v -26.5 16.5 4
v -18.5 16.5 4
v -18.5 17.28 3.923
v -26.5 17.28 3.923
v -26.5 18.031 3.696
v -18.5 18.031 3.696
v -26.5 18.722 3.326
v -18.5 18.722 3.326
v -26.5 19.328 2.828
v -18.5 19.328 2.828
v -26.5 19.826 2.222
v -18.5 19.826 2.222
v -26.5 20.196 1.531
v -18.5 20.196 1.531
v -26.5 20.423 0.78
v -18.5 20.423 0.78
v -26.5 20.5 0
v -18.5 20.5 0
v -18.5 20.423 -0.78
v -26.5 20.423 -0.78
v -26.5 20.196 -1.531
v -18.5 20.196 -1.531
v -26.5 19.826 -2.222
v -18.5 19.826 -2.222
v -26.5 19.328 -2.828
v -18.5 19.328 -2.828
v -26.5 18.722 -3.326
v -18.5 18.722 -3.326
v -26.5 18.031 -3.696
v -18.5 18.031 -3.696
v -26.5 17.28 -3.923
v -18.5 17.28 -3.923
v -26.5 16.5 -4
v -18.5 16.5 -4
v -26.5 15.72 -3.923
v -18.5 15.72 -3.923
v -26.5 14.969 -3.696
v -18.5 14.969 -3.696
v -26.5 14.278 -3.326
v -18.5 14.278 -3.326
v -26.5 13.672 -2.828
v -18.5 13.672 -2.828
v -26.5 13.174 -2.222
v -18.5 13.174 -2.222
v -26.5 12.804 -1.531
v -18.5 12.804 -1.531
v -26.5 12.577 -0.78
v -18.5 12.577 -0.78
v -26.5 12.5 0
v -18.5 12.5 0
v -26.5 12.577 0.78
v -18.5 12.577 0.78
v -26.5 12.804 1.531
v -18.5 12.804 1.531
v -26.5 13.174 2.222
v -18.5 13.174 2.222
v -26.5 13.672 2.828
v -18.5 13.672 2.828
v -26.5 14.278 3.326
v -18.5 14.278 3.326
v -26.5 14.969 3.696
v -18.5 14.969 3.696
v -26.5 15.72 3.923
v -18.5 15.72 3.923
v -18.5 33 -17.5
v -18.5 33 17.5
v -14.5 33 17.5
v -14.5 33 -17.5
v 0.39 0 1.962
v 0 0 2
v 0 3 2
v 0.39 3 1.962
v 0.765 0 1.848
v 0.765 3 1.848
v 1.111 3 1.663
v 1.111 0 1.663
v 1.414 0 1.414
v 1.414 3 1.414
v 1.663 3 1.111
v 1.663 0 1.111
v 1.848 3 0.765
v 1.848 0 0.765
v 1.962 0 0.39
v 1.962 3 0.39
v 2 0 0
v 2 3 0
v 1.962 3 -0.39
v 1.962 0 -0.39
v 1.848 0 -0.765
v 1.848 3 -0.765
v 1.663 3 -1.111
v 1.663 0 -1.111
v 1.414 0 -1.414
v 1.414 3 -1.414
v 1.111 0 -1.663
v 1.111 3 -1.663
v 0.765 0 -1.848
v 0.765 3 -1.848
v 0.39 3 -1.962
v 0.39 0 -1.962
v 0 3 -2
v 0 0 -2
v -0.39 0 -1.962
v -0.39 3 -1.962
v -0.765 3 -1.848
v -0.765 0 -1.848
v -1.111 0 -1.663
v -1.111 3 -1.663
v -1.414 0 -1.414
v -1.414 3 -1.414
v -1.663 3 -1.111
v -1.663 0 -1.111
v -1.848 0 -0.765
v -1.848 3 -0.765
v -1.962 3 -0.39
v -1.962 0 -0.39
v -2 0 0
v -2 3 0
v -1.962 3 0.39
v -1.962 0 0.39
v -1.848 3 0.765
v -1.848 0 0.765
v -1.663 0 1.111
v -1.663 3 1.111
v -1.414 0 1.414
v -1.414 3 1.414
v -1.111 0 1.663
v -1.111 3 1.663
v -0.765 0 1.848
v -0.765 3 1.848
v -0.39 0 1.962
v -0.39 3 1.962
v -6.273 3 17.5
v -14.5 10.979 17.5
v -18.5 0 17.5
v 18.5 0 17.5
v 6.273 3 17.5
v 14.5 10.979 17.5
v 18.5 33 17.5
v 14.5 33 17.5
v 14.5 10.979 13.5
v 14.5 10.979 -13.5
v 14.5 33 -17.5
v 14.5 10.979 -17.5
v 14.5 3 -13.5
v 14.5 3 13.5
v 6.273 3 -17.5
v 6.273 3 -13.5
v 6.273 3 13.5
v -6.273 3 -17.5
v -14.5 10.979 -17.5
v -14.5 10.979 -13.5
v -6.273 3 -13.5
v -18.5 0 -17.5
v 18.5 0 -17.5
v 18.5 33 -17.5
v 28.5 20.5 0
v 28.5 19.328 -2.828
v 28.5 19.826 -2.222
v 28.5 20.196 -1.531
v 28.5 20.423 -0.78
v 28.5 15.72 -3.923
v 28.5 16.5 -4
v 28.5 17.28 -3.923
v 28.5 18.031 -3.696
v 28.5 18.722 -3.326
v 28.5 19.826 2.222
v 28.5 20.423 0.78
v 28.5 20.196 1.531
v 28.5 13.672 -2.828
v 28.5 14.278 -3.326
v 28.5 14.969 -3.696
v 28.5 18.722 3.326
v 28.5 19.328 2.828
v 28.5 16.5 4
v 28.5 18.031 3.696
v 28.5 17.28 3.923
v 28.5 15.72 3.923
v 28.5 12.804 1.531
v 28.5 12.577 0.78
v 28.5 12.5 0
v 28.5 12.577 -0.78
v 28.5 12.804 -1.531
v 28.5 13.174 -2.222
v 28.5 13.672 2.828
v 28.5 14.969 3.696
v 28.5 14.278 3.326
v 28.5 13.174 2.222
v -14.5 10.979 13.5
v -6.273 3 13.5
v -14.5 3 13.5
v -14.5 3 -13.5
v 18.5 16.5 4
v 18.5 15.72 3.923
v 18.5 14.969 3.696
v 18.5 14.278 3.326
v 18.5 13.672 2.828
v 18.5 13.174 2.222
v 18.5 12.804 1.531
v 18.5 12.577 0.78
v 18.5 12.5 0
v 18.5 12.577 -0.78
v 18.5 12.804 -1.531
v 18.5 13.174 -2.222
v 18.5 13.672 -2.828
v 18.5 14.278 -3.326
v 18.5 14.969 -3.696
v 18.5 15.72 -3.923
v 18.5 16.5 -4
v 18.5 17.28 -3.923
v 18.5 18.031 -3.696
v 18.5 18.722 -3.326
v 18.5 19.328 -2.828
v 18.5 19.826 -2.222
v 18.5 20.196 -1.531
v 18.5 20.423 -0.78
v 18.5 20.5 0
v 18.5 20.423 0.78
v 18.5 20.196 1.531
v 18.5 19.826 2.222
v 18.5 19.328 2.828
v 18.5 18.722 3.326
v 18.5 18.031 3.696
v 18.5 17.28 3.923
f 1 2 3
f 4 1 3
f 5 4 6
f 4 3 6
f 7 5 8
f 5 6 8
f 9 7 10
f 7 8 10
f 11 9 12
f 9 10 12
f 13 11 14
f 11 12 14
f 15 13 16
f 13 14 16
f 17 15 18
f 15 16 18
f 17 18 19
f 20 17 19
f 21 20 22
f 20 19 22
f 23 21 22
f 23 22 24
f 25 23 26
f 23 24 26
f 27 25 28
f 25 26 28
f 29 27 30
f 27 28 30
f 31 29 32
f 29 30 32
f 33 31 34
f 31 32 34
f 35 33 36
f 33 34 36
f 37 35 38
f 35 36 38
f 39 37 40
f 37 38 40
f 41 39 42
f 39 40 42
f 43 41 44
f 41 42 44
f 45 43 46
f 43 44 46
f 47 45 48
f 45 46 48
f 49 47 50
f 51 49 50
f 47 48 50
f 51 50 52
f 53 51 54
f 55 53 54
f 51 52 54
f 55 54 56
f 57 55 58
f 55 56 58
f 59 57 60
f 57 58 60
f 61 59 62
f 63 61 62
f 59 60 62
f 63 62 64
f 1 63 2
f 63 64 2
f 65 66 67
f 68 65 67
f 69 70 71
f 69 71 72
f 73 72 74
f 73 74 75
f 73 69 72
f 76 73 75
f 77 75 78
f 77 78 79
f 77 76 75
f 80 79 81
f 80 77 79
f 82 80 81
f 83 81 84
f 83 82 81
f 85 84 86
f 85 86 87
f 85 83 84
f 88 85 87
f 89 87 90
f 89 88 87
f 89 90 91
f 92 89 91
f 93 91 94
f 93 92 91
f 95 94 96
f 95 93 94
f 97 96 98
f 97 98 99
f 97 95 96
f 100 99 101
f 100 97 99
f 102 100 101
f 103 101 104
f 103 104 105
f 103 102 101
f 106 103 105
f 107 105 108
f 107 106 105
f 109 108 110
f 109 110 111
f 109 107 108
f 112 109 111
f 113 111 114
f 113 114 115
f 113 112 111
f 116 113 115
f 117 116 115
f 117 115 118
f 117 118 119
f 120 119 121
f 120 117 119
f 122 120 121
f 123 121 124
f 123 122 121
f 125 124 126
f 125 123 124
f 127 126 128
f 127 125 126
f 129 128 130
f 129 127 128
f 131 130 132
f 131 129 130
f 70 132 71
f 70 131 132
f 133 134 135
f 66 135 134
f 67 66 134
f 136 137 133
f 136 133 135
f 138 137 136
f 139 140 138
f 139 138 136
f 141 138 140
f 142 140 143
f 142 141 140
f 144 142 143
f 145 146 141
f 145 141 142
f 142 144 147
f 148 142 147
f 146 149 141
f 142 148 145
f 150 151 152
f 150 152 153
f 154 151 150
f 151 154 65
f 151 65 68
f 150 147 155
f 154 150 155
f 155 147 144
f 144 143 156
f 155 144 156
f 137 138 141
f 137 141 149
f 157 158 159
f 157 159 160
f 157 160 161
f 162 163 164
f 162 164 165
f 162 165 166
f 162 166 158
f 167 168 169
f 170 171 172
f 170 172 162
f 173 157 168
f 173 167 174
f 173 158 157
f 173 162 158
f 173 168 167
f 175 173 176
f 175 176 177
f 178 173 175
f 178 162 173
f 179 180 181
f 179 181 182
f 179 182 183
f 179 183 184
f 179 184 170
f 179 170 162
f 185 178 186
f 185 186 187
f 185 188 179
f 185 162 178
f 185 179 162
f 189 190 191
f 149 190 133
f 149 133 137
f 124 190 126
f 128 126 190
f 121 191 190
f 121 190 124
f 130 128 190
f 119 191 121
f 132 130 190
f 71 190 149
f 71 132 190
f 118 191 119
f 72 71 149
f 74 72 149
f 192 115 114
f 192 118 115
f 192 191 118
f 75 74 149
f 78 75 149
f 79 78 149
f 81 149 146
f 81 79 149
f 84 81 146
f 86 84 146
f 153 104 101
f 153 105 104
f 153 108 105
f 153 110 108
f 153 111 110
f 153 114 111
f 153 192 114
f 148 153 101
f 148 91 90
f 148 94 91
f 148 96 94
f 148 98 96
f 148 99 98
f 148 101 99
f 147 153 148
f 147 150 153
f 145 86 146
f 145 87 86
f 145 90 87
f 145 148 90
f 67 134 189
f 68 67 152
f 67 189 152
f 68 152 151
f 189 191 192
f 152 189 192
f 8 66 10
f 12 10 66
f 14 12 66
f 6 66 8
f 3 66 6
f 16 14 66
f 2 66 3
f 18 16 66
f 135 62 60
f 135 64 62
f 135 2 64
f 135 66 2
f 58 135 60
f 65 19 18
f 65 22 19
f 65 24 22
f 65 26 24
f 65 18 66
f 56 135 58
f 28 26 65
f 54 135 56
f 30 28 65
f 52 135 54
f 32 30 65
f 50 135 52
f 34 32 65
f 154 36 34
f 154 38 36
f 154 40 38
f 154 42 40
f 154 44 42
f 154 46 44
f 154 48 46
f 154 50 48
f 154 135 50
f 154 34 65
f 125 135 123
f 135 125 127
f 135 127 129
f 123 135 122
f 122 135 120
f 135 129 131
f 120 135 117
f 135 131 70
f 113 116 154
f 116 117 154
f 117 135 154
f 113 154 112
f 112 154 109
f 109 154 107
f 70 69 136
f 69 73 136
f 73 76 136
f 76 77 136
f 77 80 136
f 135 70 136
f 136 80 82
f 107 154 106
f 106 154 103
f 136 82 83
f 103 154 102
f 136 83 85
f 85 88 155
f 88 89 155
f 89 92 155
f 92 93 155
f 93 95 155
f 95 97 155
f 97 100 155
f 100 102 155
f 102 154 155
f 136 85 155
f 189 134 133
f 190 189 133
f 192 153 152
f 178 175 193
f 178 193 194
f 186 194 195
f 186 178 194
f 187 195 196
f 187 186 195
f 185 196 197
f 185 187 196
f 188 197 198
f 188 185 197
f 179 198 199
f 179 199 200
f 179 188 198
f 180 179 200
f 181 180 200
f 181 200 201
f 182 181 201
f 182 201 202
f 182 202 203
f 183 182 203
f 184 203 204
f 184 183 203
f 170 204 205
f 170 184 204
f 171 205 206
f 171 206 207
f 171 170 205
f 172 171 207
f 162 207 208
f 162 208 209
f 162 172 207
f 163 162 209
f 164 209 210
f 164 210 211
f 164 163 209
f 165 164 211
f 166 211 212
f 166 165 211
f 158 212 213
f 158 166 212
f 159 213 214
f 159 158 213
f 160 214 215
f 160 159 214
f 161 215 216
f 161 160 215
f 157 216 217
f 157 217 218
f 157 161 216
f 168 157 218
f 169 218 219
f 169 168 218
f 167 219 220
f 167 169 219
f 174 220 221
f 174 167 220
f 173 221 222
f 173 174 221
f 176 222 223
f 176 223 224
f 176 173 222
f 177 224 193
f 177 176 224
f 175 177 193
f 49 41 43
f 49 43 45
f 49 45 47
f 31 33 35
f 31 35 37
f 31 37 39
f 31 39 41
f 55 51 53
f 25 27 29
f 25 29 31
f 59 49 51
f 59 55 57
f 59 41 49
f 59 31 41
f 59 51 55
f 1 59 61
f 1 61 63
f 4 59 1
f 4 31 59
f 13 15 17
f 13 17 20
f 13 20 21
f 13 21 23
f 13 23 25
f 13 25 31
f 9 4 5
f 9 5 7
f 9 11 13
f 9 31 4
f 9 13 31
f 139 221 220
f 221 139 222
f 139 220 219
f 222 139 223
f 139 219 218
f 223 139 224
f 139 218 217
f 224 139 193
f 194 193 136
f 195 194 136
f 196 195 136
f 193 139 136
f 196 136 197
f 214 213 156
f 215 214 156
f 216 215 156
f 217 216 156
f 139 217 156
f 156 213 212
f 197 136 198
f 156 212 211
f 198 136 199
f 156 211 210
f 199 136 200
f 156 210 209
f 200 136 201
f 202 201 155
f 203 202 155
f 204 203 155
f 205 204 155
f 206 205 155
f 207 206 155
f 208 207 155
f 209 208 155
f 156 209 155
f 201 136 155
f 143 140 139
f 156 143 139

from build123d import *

# Parameters (mm, degrees)
SKETCH1_W            = 37
SKETCH1_H            = 35
SKETCH1_R            = 2
BOSS_EXTRUDE1_DEPTH  = 3
SKETCH2_W            = 4
SKETCH2_H            = 35
BOSS_EXTRUDE2_DEPTH  = 30
SKETCH3_R            = 4
BOSS_EXTRUDE3_DEPTH  = 8
BOSS_EXTRUDE4_START  = 10
SKETCH4_R            = 4
BOSS_EXTRUDE4_DEPTH  = 10
BOSS_EXTRUDE5_DEPTH  = 4
MIRROR2_COPY_1_DEPTH = 4


with BuildPart() as part:
    # Sketch1 → Boss-Extrude1 (new body)
    with BuildSketch(Plane(origin=(0, 0, 0), x_dir=(1, 0, 0), z_dir=(0, 1, 0))):
        Rectangle(SKETCH1_W, SKETCH1_H)
        with Locations(Location((0, 0, 0), (0, 0, 270))):
            Circle(SKETCH1_R, mode=Mode.SUBTRACT)
    extrude(amount=BOSS_EXTRUDE1_DEPTH)

    # Sketch2 → Boss-Extrude2 (add)
    with BuildSketch(Plane(origin=(0, 3, 0), x_dir=(1, 0, 0), z_dir=(0, 1, 0))):
        with Locations((-16.5, 0)):
            Rectangle(SKETCH2_W, SKETCH2_H)
        with Locations((16.5, 0)):
            Rectangle(SKETCH2_W, SKETCH2_H)
    extrude(amount=BOSS_EXTRUDE2_DEPTH)

    # Sketch3 → Boss-Extrude3 (add)
    with BuildSketch(Plane.ZY.offset(18.5)):
        with Locations((0, 16.5)):
            Circle(SKETCH3_R)
    extrude(amount=BOSS_EXTRUDE3_DEPTH)

    # Sketch4 → Boss-Extrude4 (add)
    with BuildSketch(Plane(origin=(18.5, 0, 0), x_dir=(0, 0, -1), z_dir=(1, 0, 0)).offset(BOSS_EXTRUDE4_START)):
        with Locations(Location((0, 16.5, 0), (0, 0, 180))):
            Circle(SKETCH4_R)
    extrude(amount=-BOSS_EXTRUDE4_DEPTH)

    # Sketch5 → Boss-Extrude5 (add)
    with BuildSketch(Plane.XY.offset(17.5)):
        Polygon((-14.5, 10.979110478), (-6.272927794, 3), (-14.5, 3), align=None)
    boss_extrude5 = extrude(amount=-BOSS_EXTRUDE5_DEPTH)

    # Mirror1: Boss-Extrude5 across plane
    add(boss_extrude5.mirror(Plane(origin=(0, 0, 0), x_dir=(0, 0, 1), z_dir=(1, 0, 0))))

    # Mirror2: Boss-Extrude5 across plane
    add(boss_extrude5.mirror(Plane.XY))

    # Mirror2 copy 1 sketch → Mirror2 copy 1 (add)
    with BuildSketch(Plane(origin=(0, 0, -17.5), x_dir=(-1, 0, 0), z_dir=(0, 0, -1))):
        Polygon((-14.5, 10.979110478), (-6.272927794, 3), (-14.5, 3), align=None)
    extrude(amount=-MIRROR2_COPY_1_DEPTH)


solid = part.part
